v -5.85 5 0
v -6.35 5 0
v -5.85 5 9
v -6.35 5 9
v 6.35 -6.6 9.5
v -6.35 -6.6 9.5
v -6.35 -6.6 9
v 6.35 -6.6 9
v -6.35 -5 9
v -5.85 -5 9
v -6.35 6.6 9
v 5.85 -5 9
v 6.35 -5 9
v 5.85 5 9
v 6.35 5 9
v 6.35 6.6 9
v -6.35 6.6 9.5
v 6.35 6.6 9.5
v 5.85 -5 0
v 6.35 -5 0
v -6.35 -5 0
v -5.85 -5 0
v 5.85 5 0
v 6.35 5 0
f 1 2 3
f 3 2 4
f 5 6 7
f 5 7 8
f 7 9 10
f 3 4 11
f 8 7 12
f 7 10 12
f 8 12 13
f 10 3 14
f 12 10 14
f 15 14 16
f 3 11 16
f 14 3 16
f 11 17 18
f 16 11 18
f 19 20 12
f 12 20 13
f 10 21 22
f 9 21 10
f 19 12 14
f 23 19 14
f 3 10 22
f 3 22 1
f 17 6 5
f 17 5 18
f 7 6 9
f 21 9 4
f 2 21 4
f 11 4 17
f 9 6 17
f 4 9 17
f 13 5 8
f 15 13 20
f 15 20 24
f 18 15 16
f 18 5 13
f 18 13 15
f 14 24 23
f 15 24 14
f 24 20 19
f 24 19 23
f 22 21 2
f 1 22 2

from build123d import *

# Parameters (mm, degrees)
SKETCH006_W  = 10
SKETCH006_H  = 9.5
PAD002_DEPTH = 0.5
SKETCH007_W  = 12.7
SKETCH007_H  = 13.2
PAD003_DEPTH = 0.5
SKETCH008_W  = 10
SKETCH008_H  = 9.5
PAD004_DEPTH = 0.5


with BuildPart() as part:
    # Sketch006 → Pad002 (new body)
    with BuildSketch(Plane.YZ.offset(6.35)):
        with Locations((0, 4.75)):
            Rectangle(SKETCH006_W, SKETCH006_H)
    extrude(amount=-PAD002_DEPTH)

    # Sketch007 → Pad003 (join)
    with BuildSketch(Plane.XY.offset(9.5)):
        Rectangle(SKETCH007_W, SKETCH007_H)
    extrude(amount=-PAD003_DEPTH)

    # Sketch008 → Pad004 (join)
    with BuildSketch(Plane.YZ.offset(-6.35)):
        with Locations((0, 4.75)):
            Rectangle(SKETCH008_W, SKETCH008_H)
    extrude(amount=PAD004_DEPTH)


solid = part.part
